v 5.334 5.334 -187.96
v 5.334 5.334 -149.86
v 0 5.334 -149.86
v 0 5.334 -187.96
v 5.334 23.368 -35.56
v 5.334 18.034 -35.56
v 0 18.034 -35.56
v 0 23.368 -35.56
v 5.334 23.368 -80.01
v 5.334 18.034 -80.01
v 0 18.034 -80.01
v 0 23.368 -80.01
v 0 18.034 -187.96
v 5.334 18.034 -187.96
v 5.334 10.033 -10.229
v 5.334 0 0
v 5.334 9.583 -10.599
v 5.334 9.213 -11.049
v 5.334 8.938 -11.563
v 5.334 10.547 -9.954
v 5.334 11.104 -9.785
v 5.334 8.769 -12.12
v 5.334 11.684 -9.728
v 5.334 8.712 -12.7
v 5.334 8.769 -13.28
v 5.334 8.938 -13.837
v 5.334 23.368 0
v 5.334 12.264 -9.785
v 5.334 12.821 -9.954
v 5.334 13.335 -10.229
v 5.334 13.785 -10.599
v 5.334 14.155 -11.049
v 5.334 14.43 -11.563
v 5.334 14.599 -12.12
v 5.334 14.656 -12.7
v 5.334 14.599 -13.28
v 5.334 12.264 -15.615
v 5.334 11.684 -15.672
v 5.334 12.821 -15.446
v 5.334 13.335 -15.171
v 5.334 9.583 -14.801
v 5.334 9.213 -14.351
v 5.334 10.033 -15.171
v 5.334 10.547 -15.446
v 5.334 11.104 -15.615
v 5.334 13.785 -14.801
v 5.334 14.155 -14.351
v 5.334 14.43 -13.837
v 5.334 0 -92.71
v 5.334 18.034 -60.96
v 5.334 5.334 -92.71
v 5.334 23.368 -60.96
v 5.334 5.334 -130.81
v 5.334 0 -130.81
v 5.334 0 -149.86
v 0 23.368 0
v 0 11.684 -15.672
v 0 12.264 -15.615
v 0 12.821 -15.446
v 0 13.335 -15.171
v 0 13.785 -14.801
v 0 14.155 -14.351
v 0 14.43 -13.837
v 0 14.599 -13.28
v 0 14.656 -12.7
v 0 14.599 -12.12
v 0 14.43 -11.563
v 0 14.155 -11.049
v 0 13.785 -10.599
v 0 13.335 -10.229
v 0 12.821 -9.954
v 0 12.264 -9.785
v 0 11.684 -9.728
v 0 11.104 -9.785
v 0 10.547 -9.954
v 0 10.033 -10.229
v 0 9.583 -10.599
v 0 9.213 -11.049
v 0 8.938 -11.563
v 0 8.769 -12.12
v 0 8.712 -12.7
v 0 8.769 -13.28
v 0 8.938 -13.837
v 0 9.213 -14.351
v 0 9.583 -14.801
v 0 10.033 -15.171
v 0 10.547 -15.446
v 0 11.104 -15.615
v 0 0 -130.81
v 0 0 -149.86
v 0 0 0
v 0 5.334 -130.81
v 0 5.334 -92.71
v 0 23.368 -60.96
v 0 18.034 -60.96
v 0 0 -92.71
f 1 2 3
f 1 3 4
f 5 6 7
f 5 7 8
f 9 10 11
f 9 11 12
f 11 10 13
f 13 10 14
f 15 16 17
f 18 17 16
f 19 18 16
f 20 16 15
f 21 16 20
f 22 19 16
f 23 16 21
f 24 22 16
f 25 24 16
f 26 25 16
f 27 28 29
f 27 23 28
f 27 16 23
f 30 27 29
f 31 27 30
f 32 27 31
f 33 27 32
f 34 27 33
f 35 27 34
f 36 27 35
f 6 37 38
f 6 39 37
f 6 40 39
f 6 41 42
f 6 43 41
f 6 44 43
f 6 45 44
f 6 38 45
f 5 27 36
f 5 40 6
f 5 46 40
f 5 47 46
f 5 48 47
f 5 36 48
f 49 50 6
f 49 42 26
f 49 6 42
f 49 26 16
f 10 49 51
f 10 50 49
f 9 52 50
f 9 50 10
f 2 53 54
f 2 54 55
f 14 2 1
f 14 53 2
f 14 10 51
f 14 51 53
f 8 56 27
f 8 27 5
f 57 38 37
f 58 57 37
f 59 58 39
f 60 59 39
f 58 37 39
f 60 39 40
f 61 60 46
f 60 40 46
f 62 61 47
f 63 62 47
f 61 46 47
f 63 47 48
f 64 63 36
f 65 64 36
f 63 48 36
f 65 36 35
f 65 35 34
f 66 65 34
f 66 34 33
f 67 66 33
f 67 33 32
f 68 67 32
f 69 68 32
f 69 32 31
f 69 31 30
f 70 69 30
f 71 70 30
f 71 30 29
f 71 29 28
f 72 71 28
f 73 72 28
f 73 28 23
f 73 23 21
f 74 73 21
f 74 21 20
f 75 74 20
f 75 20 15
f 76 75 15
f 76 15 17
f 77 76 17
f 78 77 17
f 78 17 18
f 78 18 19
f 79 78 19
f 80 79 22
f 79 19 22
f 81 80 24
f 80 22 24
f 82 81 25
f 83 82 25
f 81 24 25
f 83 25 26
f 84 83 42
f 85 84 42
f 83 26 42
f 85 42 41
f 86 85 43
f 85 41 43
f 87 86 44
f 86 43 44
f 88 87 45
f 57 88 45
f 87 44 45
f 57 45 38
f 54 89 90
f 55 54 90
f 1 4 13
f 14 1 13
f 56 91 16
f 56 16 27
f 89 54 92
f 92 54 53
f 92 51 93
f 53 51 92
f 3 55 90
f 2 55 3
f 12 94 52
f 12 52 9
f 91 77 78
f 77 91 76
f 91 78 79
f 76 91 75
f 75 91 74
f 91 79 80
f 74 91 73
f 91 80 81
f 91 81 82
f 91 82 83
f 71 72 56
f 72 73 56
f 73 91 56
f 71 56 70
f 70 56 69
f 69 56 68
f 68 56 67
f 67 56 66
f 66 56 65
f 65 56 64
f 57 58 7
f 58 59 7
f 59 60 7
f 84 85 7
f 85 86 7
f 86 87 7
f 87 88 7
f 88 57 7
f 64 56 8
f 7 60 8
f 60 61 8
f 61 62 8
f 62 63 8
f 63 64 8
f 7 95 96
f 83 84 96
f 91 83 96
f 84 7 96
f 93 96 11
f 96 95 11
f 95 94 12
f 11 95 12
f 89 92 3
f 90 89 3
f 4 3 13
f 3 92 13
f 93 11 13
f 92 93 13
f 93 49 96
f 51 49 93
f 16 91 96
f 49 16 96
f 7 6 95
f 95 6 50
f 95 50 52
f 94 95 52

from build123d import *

# Parameters (mm, degrees)
SKETCH1_W   = 187.96
SKETCH1_H   = 23.368
BASE_DEPTH  = 5.334
SKETCH3_W   = 25.4
SKETCH3_H   = 5.334
SKETCH3_W_2 = 38.1
SKETCH3_W_3 = 107.95
TABS_DEPTH  = 190.482127337
SKETCH4_R   = 2.9718
AXLE_DEPTH  = 190.482127337


with BuildPart() as part:
    # Sketch1 → Base (new body)
    with BuildSketch(Plane(origin=(0, 0, 0), x_dir=(0, 0, -1), z_dir=(1, 0, 0))):
        with Locations((93.98, 11.684)):
            Rectangle(SKETCH1_W, SKETCH1_H)
    extrude(amount=BASE_DEPTH)

    # Sketch3 → Tabs (cut, through all)
    with BuildSketch(Plane(origin=(5.334, 0, 0), x_dir=(0, 0, -1), z_dir=(1, 0, 0))):
        with Locations((48.26, 20.701)):
            Rectangle(SKETCH3_W, SKETCH3_H)
        with Locations((111.76, 2.667)):
            Rectangle(SKETCH3_W_2, SKETCH3_H)
        with Locations((168.91, 2.667)):
            Rectangle(SKETCH3_W_2, SKETCH3_H)
        with Locations((133.985, 20.701)):
            Rectangle(SKETCH3_W_3, SKETCH3_H)
    extrude(amount=-TABS_DEPTH, mode=Mode.SUBTRACT)

    # Sketch4 → Axle (cut, through all)
    with BuildSketch(Plane(origin=(5.334, 0, 0), x_dir=(0, 0, -1), z_dir=(1, 0, 0))):
        with Locations((12.7, 11.684)):
            Circle(SKETCH4_R)
    extrude(amount=-AXLE_DEPTH, mode=Mode.SUBTRACT)


solid = part.part
